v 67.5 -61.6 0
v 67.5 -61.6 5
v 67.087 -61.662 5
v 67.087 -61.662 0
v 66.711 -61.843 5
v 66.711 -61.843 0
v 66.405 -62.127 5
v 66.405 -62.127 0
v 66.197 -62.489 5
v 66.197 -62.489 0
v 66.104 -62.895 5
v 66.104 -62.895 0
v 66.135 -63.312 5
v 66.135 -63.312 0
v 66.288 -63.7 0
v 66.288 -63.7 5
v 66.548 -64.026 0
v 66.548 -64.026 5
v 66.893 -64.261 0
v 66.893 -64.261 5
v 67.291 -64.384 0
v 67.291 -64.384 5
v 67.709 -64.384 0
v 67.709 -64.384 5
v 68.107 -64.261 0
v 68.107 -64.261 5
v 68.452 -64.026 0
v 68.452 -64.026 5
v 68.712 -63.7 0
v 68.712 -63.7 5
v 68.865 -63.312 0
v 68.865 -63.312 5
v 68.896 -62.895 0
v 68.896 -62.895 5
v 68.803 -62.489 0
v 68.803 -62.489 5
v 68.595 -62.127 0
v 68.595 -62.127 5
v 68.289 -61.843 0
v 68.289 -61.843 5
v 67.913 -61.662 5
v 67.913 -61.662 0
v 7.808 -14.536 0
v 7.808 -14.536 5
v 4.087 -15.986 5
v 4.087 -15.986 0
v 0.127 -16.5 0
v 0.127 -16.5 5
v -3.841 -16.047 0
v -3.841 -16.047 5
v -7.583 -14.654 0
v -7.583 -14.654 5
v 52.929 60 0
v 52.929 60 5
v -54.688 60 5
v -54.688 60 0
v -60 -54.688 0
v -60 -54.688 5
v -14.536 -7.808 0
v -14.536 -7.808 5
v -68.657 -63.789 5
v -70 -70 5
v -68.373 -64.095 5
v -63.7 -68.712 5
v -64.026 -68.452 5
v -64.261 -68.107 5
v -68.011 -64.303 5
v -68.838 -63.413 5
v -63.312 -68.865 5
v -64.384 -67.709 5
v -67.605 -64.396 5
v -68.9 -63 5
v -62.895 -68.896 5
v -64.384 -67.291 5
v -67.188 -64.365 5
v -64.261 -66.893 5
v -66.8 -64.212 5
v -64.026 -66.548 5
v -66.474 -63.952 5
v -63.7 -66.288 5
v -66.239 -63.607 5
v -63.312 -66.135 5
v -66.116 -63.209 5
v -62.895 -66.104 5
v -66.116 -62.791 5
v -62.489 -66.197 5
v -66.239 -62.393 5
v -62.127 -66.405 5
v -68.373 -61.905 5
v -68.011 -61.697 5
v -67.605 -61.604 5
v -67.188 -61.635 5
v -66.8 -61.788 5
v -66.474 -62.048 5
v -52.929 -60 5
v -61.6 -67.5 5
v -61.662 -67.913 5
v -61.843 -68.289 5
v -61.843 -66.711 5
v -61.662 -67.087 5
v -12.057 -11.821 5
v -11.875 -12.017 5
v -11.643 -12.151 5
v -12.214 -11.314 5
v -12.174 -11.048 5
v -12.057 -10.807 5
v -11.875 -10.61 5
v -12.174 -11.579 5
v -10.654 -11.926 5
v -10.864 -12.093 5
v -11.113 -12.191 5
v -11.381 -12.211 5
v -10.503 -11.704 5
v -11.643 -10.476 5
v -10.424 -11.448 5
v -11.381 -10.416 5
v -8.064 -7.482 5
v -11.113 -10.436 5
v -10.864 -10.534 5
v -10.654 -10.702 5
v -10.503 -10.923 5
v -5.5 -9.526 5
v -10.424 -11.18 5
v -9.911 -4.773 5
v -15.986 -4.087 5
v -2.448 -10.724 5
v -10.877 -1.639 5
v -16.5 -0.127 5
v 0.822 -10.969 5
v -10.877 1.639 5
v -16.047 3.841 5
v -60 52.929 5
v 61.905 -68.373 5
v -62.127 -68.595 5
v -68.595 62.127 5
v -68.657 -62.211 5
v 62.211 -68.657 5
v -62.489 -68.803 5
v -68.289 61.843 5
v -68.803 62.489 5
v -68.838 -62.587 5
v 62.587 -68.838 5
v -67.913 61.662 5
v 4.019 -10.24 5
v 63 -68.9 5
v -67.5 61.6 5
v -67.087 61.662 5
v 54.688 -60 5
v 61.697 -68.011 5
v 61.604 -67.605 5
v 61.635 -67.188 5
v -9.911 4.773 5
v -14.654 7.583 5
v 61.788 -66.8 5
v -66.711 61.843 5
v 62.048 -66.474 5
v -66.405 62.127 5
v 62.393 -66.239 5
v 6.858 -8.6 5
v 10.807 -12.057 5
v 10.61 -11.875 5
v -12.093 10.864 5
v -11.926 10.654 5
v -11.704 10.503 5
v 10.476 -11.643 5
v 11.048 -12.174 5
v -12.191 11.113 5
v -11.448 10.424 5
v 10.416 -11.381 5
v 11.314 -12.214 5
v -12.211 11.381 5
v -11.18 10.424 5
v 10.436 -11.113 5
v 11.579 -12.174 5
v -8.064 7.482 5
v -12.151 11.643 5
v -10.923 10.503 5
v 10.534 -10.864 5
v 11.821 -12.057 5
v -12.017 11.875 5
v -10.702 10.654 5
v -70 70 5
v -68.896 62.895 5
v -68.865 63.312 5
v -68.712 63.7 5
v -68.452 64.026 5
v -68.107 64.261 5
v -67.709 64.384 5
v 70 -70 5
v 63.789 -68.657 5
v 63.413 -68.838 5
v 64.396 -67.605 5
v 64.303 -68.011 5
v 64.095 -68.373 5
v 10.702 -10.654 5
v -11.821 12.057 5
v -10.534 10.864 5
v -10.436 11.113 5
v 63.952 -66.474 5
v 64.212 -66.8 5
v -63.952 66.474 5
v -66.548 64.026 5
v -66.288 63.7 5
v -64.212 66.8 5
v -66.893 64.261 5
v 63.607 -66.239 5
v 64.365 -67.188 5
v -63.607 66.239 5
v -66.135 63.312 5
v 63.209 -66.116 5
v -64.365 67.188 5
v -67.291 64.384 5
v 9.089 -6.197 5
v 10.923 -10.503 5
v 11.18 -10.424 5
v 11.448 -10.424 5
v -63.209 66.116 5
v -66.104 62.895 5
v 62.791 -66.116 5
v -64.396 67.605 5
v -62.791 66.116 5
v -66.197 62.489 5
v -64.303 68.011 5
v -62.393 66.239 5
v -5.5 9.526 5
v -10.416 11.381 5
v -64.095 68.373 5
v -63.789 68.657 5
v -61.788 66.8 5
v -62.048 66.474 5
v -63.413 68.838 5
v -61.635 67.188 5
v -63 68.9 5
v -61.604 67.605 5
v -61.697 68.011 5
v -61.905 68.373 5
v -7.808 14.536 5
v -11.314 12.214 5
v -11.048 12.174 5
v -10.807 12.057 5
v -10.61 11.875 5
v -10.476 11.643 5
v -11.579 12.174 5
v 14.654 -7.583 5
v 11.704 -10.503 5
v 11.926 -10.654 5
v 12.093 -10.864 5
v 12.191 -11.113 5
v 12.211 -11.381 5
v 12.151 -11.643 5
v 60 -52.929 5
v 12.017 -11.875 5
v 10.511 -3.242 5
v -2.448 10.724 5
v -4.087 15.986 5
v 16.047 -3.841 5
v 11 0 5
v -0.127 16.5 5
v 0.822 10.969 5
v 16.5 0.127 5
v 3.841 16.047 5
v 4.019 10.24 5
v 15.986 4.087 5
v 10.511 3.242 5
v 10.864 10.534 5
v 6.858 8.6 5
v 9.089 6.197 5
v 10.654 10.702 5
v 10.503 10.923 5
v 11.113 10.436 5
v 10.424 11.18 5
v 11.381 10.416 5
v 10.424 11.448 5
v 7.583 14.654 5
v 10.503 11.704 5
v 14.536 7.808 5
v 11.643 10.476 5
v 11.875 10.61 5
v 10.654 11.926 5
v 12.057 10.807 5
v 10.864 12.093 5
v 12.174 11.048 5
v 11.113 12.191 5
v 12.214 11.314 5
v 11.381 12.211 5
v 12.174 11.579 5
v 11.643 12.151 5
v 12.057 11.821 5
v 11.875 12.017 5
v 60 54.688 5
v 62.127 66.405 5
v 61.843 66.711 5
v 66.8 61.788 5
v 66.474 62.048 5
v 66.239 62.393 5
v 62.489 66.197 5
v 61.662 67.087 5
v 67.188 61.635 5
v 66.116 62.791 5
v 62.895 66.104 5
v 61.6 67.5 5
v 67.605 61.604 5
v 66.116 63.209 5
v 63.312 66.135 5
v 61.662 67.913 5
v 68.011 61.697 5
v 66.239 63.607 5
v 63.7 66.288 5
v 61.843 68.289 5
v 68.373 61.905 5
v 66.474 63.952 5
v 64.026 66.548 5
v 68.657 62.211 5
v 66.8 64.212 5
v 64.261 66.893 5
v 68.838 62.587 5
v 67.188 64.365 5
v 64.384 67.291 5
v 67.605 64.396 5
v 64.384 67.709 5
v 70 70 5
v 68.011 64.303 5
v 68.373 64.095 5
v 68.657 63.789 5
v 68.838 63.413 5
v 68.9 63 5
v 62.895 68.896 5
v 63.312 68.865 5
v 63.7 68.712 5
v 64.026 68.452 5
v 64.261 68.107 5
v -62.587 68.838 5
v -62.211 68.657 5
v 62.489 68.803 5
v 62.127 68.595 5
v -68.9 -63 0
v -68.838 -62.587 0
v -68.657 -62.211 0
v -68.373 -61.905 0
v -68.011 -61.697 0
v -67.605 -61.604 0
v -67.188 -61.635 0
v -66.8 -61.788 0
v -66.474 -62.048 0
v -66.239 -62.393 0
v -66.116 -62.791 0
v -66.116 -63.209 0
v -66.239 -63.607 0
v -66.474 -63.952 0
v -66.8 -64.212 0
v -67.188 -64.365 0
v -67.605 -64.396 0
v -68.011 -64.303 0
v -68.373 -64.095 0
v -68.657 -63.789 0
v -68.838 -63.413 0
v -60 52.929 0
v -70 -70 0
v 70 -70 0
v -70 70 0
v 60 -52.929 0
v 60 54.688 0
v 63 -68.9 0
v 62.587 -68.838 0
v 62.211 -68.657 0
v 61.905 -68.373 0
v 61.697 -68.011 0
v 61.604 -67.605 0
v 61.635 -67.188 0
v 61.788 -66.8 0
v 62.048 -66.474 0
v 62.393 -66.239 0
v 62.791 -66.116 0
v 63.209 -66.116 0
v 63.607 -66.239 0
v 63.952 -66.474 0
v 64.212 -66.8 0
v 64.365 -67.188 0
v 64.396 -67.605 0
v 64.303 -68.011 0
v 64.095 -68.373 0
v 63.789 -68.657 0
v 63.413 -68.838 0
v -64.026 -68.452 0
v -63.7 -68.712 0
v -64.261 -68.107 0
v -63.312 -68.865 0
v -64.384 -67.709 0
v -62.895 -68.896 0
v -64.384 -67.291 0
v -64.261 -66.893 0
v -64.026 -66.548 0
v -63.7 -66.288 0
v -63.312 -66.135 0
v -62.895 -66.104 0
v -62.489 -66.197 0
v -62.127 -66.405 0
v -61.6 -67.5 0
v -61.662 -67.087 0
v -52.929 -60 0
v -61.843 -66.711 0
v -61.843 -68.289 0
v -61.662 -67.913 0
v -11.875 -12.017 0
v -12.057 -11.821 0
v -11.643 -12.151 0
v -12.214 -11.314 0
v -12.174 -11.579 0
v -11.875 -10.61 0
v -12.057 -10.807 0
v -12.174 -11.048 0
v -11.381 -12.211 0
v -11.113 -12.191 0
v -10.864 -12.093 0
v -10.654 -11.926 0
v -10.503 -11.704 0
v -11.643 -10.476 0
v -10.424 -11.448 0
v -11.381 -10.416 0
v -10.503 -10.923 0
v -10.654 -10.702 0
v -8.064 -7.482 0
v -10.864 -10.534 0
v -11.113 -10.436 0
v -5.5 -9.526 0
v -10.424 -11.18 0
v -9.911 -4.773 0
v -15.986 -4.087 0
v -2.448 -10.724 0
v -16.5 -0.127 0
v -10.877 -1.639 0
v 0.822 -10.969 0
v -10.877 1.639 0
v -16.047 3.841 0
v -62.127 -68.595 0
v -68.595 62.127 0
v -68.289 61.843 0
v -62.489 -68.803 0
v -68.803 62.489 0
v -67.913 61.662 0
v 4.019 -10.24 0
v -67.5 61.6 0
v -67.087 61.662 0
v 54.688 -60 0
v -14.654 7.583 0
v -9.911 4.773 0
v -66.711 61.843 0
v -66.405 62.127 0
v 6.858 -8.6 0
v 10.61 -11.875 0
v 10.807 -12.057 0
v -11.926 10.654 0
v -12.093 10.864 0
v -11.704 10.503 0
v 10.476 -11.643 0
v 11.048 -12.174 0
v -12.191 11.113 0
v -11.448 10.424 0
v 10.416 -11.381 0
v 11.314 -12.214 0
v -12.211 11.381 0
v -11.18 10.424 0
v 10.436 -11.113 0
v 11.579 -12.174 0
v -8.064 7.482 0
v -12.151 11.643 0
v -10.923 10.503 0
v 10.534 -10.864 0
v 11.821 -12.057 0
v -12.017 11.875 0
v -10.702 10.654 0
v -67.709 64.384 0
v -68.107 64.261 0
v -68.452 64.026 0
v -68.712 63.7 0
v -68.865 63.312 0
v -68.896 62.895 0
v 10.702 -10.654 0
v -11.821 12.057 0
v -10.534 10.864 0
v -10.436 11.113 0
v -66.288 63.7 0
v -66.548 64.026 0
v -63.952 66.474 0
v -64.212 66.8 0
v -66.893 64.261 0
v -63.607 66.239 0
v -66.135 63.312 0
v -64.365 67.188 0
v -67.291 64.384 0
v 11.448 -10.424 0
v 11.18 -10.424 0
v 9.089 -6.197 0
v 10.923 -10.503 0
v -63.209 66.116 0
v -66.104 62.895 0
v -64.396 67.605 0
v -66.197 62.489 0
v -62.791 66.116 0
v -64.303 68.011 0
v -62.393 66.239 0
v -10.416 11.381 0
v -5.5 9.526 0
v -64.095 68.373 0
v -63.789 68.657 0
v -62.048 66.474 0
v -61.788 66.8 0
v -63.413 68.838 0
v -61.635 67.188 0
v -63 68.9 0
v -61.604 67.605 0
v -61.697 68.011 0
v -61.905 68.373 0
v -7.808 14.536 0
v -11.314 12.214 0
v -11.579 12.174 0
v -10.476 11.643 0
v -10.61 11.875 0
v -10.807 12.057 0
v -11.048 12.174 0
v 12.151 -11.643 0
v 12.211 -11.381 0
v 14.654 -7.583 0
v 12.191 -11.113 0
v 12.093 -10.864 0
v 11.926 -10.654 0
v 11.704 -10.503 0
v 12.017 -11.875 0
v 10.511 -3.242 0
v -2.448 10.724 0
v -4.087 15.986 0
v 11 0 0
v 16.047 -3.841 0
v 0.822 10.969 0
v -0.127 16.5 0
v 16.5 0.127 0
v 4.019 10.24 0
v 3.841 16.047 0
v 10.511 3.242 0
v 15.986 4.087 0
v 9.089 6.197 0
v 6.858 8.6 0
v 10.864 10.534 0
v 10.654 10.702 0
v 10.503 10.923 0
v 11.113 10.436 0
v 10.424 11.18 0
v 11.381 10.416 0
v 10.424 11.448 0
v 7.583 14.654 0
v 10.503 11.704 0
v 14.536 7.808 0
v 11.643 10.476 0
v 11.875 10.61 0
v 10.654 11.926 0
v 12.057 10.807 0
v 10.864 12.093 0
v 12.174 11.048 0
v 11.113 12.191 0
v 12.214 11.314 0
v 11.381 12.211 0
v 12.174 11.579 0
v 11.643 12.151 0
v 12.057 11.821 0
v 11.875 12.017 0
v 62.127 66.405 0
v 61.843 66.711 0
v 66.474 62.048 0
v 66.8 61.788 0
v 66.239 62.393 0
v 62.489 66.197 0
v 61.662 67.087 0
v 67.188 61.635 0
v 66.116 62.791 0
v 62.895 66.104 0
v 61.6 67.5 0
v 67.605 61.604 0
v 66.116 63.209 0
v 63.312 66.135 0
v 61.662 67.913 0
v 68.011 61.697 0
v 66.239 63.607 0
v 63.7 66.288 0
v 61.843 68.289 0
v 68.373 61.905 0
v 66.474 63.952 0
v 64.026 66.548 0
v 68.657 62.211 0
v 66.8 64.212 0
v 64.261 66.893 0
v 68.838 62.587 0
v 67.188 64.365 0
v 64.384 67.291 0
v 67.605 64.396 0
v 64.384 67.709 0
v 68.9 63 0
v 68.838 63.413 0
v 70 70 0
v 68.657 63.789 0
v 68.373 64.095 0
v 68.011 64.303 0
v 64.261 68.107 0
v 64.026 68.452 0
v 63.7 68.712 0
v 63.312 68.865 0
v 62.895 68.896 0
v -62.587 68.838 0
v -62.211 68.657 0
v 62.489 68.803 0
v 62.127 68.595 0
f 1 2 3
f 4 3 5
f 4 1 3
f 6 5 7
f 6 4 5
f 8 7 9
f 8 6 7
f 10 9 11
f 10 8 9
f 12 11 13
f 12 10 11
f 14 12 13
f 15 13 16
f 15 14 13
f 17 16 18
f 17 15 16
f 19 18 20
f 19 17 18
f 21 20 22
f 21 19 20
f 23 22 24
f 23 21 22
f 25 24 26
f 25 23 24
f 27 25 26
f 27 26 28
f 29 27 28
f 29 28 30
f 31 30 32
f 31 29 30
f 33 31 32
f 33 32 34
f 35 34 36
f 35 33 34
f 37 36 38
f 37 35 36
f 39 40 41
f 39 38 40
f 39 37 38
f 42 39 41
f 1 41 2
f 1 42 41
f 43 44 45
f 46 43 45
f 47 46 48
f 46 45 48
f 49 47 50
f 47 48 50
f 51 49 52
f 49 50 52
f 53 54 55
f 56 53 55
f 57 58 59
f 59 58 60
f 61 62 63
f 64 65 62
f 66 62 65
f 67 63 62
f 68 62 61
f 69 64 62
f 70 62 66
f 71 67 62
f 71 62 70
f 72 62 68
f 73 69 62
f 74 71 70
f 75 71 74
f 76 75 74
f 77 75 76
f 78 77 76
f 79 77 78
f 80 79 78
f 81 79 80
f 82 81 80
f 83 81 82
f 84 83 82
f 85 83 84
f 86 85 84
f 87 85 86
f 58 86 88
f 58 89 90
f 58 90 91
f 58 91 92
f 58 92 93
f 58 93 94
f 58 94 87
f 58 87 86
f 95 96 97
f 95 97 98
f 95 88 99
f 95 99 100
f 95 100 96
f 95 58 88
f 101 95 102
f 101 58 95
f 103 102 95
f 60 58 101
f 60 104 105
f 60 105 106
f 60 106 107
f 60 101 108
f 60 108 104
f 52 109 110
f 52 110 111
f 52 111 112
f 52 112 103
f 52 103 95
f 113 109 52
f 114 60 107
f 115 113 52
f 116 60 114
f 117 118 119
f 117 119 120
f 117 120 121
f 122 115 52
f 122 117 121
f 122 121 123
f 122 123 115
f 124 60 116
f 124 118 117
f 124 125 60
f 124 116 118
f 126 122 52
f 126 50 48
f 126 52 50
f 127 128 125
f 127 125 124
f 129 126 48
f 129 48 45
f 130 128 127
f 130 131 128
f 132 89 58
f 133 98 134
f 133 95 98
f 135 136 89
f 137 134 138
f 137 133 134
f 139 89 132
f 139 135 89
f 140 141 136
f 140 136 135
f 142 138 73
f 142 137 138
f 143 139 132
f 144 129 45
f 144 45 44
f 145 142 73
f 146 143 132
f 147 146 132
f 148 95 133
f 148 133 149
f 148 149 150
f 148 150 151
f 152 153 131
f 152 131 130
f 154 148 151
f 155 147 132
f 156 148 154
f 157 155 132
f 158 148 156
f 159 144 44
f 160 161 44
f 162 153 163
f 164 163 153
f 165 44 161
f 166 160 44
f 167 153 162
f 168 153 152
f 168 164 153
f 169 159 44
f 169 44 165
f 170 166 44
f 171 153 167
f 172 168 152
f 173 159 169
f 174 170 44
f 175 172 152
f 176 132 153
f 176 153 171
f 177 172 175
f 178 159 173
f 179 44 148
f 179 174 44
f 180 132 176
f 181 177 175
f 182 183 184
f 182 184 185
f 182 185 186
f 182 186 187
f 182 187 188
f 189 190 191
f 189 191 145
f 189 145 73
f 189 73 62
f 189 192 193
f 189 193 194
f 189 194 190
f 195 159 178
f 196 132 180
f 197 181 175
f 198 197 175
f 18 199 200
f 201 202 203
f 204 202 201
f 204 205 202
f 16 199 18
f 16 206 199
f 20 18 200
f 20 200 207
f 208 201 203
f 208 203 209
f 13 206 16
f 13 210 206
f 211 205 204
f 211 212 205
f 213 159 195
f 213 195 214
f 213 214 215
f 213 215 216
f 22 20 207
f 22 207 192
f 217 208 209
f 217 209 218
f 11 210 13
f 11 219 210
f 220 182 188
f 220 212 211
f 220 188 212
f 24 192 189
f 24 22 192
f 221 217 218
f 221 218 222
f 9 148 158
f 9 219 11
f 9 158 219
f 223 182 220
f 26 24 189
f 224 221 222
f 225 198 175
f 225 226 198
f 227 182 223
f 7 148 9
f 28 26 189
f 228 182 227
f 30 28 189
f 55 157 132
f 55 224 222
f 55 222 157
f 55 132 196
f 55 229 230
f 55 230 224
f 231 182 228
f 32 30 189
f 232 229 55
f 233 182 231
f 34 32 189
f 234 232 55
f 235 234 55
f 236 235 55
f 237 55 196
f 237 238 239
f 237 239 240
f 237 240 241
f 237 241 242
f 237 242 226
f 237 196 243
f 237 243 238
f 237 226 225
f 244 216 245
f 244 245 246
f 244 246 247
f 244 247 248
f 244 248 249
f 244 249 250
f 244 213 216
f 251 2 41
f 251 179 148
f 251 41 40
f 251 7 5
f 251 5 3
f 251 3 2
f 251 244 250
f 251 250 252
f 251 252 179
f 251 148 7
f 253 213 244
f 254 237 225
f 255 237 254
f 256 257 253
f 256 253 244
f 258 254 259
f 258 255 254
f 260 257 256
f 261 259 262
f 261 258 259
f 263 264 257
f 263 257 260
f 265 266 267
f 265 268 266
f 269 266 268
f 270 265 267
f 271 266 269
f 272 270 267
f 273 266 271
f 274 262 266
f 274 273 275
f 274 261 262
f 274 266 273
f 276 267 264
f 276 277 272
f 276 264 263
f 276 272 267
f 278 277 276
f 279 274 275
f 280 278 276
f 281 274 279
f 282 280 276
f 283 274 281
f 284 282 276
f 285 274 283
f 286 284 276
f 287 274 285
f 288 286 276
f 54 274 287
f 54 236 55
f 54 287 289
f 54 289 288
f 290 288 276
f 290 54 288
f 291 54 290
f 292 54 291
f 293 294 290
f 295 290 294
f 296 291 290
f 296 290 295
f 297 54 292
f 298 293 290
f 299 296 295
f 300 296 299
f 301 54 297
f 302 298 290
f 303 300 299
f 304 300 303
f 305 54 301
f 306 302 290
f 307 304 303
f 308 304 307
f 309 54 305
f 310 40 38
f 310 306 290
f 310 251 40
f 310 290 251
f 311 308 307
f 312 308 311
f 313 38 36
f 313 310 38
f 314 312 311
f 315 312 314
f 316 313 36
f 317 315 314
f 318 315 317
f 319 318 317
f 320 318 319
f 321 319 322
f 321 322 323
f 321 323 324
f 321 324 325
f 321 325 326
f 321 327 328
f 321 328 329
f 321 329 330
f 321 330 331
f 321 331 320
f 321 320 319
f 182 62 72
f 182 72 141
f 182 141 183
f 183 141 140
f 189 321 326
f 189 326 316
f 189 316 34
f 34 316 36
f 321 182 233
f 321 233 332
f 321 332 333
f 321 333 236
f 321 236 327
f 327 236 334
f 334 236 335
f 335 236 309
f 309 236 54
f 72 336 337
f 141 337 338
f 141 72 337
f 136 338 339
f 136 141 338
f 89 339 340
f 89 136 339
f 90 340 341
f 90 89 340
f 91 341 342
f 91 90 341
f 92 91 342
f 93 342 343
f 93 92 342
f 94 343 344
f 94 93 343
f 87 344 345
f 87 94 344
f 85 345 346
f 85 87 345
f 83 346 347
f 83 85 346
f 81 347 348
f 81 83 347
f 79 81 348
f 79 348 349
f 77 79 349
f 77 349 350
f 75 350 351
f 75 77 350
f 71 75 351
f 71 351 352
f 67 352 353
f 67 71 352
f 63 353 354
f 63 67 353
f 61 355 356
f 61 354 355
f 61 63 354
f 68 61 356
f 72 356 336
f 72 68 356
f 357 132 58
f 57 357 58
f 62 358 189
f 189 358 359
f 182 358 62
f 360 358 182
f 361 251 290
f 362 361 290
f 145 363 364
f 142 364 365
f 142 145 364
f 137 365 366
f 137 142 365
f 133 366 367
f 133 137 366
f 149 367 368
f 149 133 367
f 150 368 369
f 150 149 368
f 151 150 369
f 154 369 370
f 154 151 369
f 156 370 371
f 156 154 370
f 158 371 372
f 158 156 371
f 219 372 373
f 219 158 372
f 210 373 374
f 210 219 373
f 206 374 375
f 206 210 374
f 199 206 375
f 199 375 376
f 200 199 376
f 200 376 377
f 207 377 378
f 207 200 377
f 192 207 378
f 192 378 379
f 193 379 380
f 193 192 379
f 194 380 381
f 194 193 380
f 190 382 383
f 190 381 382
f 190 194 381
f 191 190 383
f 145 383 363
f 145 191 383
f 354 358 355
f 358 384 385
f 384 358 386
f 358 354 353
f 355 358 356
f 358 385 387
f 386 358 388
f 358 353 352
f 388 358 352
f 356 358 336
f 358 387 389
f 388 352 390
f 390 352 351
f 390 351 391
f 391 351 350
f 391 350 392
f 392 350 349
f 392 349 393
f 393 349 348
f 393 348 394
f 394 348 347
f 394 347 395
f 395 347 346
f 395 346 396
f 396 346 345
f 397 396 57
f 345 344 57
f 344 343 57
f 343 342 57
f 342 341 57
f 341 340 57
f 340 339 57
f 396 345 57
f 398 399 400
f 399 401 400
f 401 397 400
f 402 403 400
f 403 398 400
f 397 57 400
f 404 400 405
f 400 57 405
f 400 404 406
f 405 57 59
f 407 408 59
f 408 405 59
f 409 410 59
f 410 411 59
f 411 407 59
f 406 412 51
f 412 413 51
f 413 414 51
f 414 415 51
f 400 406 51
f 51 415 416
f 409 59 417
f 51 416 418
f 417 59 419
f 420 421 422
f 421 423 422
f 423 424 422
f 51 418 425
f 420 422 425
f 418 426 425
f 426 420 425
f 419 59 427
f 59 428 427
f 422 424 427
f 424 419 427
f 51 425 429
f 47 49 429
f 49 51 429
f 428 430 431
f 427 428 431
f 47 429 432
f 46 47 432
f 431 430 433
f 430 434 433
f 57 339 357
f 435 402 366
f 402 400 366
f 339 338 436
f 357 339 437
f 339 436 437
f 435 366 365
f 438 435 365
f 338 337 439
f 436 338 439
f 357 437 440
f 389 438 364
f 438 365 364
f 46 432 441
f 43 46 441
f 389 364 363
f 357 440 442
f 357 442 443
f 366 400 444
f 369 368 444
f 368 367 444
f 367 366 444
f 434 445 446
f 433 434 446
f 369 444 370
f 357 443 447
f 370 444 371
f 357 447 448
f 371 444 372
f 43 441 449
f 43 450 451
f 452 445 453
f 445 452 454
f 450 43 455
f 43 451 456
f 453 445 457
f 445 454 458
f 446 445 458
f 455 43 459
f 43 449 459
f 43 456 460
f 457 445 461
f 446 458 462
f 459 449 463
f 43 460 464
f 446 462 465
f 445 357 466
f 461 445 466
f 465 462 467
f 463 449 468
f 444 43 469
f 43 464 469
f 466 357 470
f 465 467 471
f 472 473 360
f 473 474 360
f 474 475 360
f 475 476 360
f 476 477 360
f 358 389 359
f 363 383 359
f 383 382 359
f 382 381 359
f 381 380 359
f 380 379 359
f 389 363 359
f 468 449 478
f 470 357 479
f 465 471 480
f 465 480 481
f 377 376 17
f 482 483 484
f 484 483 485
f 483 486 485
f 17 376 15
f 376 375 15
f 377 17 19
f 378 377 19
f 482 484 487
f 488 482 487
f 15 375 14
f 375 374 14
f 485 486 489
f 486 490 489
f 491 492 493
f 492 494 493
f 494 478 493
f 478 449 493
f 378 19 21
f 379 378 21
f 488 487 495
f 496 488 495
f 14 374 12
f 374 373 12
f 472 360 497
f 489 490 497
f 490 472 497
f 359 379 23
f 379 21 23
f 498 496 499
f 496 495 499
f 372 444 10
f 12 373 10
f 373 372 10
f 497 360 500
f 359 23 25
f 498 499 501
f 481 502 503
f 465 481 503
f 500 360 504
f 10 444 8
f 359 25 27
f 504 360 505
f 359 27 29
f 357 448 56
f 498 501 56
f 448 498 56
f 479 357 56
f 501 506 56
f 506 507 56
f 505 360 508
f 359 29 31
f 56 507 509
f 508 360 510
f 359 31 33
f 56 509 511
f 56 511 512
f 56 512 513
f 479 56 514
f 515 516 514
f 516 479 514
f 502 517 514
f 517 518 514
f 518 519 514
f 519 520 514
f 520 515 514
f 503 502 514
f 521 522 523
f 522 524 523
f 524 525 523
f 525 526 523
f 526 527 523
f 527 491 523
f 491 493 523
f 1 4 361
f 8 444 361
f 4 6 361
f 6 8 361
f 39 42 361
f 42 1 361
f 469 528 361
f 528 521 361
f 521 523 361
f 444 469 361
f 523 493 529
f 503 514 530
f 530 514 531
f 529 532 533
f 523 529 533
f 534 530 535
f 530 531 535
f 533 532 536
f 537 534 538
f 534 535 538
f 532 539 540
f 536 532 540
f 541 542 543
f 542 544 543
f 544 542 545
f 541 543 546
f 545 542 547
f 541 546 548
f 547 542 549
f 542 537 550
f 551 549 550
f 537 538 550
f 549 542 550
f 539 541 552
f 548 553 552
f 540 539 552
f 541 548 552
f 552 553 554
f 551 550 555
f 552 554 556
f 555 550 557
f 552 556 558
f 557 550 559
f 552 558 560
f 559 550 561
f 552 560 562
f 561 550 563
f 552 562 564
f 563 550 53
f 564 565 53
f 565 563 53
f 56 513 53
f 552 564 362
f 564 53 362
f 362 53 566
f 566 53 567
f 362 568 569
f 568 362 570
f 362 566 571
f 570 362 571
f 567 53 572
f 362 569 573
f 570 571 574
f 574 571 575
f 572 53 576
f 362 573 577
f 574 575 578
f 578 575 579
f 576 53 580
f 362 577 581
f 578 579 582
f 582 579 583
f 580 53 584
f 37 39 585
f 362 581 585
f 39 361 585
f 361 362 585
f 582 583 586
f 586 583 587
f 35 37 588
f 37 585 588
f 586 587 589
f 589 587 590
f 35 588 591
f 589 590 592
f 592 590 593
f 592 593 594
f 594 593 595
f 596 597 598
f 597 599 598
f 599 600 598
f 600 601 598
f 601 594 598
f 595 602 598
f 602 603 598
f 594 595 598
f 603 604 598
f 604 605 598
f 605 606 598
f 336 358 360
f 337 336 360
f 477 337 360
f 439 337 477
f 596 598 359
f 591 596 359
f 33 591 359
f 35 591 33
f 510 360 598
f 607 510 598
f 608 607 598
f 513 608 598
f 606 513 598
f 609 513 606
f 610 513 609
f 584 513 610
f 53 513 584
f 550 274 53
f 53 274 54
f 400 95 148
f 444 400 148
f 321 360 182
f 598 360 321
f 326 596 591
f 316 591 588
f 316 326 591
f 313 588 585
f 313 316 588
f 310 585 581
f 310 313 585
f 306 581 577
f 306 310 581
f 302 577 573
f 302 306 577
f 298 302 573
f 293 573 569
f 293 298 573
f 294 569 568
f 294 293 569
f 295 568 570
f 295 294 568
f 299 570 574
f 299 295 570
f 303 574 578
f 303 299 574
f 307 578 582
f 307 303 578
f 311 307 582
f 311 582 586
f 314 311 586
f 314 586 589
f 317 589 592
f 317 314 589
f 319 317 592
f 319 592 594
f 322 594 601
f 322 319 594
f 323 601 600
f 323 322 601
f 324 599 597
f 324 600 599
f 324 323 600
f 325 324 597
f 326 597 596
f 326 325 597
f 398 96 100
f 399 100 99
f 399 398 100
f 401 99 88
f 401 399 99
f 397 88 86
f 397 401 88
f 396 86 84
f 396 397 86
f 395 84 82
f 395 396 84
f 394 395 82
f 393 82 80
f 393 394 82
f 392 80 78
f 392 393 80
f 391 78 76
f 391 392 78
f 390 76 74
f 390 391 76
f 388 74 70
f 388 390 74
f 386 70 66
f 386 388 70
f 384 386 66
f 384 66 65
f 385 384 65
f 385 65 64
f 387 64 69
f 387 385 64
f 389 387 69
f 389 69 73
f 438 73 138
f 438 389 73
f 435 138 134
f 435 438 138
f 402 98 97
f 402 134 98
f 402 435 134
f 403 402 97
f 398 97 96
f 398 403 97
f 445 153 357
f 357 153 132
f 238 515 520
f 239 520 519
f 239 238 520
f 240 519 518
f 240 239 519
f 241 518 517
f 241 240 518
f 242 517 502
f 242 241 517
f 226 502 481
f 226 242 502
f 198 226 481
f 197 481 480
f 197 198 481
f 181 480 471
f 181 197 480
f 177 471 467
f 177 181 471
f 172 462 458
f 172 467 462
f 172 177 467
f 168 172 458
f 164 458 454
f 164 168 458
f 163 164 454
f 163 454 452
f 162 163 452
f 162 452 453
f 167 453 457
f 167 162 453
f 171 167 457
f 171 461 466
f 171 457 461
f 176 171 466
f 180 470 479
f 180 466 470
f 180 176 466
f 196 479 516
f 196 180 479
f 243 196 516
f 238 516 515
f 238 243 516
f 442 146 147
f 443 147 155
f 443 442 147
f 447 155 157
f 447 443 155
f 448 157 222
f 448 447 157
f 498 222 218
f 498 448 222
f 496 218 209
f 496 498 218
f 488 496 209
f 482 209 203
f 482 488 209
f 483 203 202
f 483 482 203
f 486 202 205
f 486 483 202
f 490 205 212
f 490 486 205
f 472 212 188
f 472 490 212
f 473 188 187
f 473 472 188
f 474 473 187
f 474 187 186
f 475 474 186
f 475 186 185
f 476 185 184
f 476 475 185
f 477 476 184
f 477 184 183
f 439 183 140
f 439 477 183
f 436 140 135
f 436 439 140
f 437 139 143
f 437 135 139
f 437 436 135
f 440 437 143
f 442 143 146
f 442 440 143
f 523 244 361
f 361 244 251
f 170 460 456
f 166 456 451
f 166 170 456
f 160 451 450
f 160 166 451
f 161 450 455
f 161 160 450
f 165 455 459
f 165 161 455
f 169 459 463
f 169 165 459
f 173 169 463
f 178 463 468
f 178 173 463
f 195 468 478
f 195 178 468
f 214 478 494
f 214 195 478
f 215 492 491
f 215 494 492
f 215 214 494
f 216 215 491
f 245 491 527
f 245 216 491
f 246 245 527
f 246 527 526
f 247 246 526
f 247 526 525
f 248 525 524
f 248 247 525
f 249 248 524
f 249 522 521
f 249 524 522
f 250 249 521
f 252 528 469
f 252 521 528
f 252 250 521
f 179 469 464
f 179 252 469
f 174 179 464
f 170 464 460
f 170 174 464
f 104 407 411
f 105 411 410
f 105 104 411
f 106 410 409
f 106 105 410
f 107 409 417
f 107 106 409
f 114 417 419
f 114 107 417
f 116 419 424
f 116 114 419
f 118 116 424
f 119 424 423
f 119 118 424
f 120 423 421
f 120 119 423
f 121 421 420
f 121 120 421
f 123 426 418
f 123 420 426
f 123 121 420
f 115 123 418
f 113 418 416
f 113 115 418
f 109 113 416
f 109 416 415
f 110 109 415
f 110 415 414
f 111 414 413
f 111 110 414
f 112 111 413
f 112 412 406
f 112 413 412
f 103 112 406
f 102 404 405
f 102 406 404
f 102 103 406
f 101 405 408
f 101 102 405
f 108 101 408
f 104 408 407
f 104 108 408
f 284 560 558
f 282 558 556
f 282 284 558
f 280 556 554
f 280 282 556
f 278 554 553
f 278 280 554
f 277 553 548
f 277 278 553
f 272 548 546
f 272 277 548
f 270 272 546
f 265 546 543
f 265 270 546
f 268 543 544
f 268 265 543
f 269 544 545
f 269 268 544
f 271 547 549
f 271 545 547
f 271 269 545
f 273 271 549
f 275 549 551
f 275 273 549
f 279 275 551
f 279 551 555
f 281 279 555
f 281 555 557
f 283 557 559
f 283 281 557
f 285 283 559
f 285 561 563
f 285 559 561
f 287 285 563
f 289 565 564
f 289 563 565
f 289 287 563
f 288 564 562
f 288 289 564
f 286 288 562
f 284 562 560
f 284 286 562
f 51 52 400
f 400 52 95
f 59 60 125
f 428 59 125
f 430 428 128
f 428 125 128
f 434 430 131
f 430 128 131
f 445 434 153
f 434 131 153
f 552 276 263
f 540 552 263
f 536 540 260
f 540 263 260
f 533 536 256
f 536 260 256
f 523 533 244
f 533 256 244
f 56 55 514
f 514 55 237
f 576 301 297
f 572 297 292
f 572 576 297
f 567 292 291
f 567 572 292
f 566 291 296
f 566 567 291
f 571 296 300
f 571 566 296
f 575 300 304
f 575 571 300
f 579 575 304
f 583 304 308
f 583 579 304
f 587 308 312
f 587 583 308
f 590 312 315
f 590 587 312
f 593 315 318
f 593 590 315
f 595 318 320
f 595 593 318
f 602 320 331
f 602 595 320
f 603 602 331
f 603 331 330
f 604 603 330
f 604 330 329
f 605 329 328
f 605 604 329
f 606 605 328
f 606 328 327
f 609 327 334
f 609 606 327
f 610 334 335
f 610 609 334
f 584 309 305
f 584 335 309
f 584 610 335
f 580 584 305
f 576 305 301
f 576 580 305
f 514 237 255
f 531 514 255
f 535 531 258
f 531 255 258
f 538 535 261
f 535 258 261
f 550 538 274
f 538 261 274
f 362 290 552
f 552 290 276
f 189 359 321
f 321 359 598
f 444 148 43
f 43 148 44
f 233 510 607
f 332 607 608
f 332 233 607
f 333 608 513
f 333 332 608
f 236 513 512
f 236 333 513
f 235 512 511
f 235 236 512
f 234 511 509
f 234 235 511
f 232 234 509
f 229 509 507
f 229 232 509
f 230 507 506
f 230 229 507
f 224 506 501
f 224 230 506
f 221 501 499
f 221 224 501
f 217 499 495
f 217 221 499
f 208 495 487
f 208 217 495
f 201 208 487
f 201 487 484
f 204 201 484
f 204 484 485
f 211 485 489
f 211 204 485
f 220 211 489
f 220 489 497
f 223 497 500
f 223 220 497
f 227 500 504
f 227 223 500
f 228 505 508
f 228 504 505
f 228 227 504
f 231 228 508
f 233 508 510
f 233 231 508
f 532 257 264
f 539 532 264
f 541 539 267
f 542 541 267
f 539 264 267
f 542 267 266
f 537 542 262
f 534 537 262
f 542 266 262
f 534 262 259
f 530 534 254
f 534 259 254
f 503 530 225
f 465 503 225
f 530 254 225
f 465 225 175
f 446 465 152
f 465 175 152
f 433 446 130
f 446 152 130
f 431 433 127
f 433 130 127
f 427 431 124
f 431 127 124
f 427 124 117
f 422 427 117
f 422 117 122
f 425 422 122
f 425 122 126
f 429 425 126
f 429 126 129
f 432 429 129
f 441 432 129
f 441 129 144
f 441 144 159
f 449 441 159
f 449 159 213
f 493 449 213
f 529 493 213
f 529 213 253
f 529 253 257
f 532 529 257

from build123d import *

# Parameters (mm, degrees)
SKETCH3_W           = 140
SKETCH3_H           = 140
BOSS_EXTRUDE1_DEPTH = 5
CUT_EXTRUDE1_DEPTH  = 5
CIRPATTERN1_COUNT   = 4
CUT_EXTRUDE2_REACH  = 101.121
SKETCH7_R           = 11
CIRPATTERN2_COUNT   = 4
CIRPATTERN3_COUNT   = 4


with BuildPart() as part:
    # Sketch3 → Boss-Extrude1 (new body)
    with BuildSketch(Plane.XY):
        Rectangle(SKETCH3_W, SKETCH3_H)
    extrude(amount=BOSS_EXTRUDE1_DEPTH)

    # Sketch4 → Cut-Extrude1 (cut)
    with BuildSketch(Plane.XY.offset(5)):
        with BuildLine():
            Line((7.583144073, 14.654211885), (52.928932188, 60))
            Line((52.928932188, 60), (-54.688394727, 60))
            Line((-54.688394727, 60), (-7.80758307, 14.53587447))
            ThreePointArc((-7.80758307, 14.53587447), (-0.126862728, 16.499512291), (7.583144073, 14.654211885))
        make_face()
    cut_extrude1 = extrude(amount=-CUT_EXTRUDE1_DEPTH, mode=Mode.SUBTRACT)

    # CirPattern1: Cut-Extrude1 ×4 about axis
    cirpattern1_axis = Axis((0, 0, 5), (0, 0, -1))
    for i in range(1, CIRPATTERN1_COUNT):
        add(cut_extrude1.rotate(cirpattern1_axis, i * 360 / CIRPATTERN1_COUNT), mode=Mode.SUBTRACT)

    # Sketch7 → Cut-Extrude2 (cut, up to next)
    with BuildSketch(Plane.XY.offset(5), mode=Mode.PRIVATE) as cut_extrude2_sk1:
        Circle(SKETCH7_R)
    cut_extrude2_tool1 = extrude(cut_extrude2_sk1.sketch, amount=-CUT_EXTRUDE2_REACH, mode=Mode.PRIVATE) & part.part
    add(cut_extrude2_tool1.solids().sort_by_distance((0, 0, 5))[0], mode=Mode.SUBTRACT)

    # Sketch9 → Ø1.8 (1.8) Diameter Hole1 (revolve, cut)
    with BuildSketch(Plane(origin=(11.313708499, -11.313708499, 5), x_dir=(0, -1, 0), z_dir=(1, 0, 0))):
        Polygon((0, 0), (0, 6.540774557), (0.9, 6), (0.9, 0), align=None)
    f_1_8_1_8_diameter_hole1 = revolve(axis=Axis((11.313708499, -11.313708499, 11.35), (0, 0, -1)), mode=Mode.SUBTRACT)

    # CirPattern2: Ø1.8 (1.8) Diameter Hole1 ×4 about axis
    cirpattern2_axis = Axis((0, 0, 0), (0, 0, 1))
    for i in range(1, CIRPATTERN2_COUNT):
        add(f_1_8_1_8_diameter_hole1.rotate(cirpattern2_axis, i * 360 / CIRPATTERN2_COUNT), mode=Mode.SUBTRACT)

    # Sketch10 → Ø3.0mm Dowel Hole1 (revolve, cut)
    with BuildSketch(Plane(origin=(67.5, -63, 0), x_dir=(0, 1, 0), z_dir=(1, 0, 0))):
        Polygon((0, 0), (0, 10.841204867), (1.4, 10), (1.4, 0), align=None)
    f_3_0mm_dowel_hole1 = revolve(axis=Axis((67.5, -63, -6.35), (0, 0, 1)), mode=Mode.SUBTRACT)

    # Sketch11 → Ø3.0mm Dowel Hole2 (revolve, cut)
    with BuildSketch(Plane(origin=(63, -67.5, 5), x_dir=(0, -1, 0), z_dir=(1, 0, 0))):
        Polygon((0, 0), (0, 10.841204867), (1.4, 10), (1.4, 0), align=None)
    f_3_0mm_dowel_hole2 = revolve(axis=Axis((63, -67.5, 11.35), (0, 0, -1)), mode=Mode.SUBTRACT)

    # CirPattern3: Ø3.0mm Dowel Hole1, Ø3.0mm Dowel Hole2 ×4 about axis
    cirpattern3_axis = Axis((0, 0, 5.25), (0, 0, -1))
    add([f_3_0mm_dowel_hole1.rotate(cirpattern3_axis, i * 360 / CIRPATTERN3_COUNT) for i in range(1, CIRPATTERN3_COUNT)], mode=Mode.SUBTRACT)
    add([f_3_0mm_dowel_hole2.rotate(cirpattern3_axis, i * 360 / CIRPATTERN3_COUNT) for i in range(1, CIRPATTERN3_COUNT)], mode=Mode.SUBTRACT)


solid = part.part
